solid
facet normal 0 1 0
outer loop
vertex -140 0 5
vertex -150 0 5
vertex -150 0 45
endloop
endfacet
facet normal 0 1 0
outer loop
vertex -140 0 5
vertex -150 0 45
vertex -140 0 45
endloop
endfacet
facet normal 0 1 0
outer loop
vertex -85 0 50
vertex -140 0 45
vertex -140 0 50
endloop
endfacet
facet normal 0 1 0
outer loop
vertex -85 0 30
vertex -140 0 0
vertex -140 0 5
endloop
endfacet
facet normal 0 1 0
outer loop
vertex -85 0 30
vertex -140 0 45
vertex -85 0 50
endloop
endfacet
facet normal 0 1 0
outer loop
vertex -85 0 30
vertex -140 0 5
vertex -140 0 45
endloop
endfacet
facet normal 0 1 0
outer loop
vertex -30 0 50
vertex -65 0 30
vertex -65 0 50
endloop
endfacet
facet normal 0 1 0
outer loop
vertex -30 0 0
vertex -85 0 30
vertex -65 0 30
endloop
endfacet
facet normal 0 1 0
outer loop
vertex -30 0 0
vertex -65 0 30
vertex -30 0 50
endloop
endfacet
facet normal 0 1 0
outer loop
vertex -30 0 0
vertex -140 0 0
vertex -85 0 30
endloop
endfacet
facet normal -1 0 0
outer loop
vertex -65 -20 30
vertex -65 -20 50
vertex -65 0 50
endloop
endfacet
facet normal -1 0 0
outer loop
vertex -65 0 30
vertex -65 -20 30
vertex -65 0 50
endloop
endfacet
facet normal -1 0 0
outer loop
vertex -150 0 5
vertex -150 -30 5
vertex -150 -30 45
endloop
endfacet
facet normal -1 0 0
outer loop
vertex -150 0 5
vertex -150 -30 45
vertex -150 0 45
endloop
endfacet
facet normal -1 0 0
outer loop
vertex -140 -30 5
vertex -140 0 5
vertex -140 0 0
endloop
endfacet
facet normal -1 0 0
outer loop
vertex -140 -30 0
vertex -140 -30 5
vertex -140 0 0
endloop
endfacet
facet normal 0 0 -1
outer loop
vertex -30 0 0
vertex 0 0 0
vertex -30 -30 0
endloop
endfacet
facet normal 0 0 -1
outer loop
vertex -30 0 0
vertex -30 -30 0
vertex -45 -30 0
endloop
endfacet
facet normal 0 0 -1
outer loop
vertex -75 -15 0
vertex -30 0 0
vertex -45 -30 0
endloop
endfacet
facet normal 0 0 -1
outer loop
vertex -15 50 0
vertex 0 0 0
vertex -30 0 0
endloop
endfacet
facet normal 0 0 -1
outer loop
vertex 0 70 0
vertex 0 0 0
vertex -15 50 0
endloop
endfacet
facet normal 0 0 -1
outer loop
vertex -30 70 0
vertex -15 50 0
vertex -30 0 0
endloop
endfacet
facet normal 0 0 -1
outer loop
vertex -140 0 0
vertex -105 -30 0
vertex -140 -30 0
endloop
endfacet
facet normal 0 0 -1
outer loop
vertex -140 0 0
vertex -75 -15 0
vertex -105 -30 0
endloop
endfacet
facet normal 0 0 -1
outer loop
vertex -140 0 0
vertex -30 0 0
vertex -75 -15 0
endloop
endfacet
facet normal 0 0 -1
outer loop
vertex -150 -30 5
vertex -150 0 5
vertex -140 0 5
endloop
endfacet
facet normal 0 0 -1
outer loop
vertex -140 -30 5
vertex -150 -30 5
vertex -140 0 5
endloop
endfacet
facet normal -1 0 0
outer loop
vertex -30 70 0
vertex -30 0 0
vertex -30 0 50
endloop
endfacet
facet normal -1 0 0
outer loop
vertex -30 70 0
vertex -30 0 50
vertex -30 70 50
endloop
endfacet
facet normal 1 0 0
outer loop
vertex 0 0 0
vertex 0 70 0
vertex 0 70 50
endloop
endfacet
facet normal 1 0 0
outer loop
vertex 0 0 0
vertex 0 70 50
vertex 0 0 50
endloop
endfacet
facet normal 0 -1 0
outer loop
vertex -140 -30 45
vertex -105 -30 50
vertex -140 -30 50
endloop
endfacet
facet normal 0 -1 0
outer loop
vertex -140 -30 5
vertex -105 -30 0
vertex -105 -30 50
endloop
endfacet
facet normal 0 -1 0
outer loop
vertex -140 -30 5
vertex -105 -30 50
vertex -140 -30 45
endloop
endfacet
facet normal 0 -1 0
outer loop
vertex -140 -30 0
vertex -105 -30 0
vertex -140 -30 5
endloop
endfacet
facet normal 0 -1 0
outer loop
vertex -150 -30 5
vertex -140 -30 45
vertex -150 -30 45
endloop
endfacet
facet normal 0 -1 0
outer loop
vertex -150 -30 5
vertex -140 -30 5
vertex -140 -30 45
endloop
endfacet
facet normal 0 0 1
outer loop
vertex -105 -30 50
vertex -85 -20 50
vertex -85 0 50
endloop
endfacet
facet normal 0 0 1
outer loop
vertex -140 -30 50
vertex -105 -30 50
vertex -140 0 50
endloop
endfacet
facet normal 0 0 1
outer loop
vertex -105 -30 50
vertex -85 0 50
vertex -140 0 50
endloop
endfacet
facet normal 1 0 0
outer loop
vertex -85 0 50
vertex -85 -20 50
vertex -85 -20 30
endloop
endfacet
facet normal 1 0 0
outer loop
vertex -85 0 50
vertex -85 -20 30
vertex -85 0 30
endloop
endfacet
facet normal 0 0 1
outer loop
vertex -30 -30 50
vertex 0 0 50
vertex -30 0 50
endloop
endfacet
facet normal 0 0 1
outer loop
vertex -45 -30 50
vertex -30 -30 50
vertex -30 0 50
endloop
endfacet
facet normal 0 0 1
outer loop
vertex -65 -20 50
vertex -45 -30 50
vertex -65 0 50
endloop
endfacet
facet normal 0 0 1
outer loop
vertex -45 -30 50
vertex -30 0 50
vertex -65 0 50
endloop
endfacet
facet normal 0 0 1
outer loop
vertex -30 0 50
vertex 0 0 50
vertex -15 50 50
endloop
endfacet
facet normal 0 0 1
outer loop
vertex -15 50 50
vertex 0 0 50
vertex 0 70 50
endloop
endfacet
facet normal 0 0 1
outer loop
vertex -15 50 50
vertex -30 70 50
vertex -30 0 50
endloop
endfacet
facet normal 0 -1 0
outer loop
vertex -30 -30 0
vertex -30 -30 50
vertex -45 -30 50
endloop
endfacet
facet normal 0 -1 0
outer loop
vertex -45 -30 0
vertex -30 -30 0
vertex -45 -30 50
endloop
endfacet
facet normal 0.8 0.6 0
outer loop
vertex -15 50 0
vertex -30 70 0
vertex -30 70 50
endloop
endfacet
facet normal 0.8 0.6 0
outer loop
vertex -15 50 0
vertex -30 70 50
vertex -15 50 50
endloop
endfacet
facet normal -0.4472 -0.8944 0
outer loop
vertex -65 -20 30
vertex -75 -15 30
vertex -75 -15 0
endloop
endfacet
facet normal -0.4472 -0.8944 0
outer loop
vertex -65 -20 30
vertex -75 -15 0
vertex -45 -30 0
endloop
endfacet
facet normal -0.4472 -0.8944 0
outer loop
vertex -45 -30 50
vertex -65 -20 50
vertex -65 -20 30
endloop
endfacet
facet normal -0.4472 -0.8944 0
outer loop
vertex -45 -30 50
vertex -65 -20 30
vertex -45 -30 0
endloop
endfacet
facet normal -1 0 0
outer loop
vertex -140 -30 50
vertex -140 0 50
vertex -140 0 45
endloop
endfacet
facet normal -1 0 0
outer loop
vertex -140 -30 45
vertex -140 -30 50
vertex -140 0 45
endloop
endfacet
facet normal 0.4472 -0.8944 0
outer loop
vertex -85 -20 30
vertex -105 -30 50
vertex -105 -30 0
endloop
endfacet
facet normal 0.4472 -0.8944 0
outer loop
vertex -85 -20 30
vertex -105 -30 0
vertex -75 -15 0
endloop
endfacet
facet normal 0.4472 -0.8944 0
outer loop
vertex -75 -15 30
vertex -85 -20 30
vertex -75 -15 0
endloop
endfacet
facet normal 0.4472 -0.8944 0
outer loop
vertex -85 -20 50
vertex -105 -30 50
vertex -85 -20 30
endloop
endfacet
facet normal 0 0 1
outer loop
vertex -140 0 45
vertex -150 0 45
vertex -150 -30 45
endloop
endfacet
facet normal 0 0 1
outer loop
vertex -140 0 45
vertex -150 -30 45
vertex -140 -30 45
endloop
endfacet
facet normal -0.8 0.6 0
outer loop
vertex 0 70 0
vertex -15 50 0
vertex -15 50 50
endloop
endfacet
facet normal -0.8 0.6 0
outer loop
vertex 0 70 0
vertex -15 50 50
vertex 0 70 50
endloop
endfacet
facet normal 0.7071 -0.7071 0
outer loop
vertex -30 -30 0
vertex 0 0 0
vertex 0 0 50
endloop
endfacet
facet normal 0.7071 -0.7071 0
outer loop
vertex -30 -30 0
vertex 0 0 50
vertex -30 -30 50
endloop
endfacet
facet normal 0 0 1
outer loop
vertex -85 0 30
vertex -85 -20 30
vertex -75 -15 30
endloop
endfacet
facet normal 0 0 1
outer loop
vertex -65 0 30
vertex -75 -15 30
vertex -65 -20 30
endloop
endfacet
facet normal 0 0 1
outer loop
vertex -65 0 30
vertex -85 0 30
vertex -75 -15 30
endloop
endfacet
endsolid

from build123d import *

# Parameters (mm, degrees)
EXTRUDE_1_DEPTH     = 50
CUT_EXTRUDE_1_DEPTH = 173.916164658
SKETCH_3_W          = 20
SKETCH_3_H          = 20
CUT_EXTRUDE_2_DEPTH = 20
SKETCH_5_W          = 10
SKETCH_5_H          = 5
CUT_EXTRUDE_3_DEPTH = 173.916164658


with BuildPart() as part:
    # Эскиз1 → Бобышка-Вытянуть1 (new body)
    with BuildSketch(Plane.XY):
        Polygon((-150, 0), (-30, 0), (-30, 70), (-15, 50), (0, 70), (0, 0), (-30, -30), (-150, -30), align=None)
    extrude(amount=EXTRUDE_1_DEPTH)

    # Эскиз2 → Вырез-Вытянуть1 (cut, through all)
    with BuildSketch(Plane.XY.offset(50)):
        Polygon((-105, -30), (-75, -15), (-45, -30), align=None)
    extrude(amount=-CUT_EXTRUDE_1_DEPTH, mode=Mode.SUBTRACT)

    # Эскиз3 → Вырез-Вытянуть2 (cut)
    with BuildSketch(Plane.XY.offset(50)):
        with Locations((-75, -10)):
            Rectangle(SKETCH_3_W, SKETCH_3_H)
    extrude(amount=-CUT_EXTRUDE_2_DEPTH, mode=Mode.SUBTRACT)

    # Эскиз5 → Вырез-Вытянуть3 (cut, through all)
    with BuildSketch(Plane(origin=(0, 0, 0), x_dir=(1, 0, 0), z_dir=(0, 1, 0))):
        with Locations((-145, -2.5)):
            Rectangle(SKETCH_5_W, SKETCH_5_H)
        with Locations((-145, -47.5)):
            Rectangle(SKETCH_5_W, SKETCH_5_H)
    extrude(amount=-CUT_EXTRUDE_3_DEPTH, mode=Mode.SUBTRACT)


solid = part.part
